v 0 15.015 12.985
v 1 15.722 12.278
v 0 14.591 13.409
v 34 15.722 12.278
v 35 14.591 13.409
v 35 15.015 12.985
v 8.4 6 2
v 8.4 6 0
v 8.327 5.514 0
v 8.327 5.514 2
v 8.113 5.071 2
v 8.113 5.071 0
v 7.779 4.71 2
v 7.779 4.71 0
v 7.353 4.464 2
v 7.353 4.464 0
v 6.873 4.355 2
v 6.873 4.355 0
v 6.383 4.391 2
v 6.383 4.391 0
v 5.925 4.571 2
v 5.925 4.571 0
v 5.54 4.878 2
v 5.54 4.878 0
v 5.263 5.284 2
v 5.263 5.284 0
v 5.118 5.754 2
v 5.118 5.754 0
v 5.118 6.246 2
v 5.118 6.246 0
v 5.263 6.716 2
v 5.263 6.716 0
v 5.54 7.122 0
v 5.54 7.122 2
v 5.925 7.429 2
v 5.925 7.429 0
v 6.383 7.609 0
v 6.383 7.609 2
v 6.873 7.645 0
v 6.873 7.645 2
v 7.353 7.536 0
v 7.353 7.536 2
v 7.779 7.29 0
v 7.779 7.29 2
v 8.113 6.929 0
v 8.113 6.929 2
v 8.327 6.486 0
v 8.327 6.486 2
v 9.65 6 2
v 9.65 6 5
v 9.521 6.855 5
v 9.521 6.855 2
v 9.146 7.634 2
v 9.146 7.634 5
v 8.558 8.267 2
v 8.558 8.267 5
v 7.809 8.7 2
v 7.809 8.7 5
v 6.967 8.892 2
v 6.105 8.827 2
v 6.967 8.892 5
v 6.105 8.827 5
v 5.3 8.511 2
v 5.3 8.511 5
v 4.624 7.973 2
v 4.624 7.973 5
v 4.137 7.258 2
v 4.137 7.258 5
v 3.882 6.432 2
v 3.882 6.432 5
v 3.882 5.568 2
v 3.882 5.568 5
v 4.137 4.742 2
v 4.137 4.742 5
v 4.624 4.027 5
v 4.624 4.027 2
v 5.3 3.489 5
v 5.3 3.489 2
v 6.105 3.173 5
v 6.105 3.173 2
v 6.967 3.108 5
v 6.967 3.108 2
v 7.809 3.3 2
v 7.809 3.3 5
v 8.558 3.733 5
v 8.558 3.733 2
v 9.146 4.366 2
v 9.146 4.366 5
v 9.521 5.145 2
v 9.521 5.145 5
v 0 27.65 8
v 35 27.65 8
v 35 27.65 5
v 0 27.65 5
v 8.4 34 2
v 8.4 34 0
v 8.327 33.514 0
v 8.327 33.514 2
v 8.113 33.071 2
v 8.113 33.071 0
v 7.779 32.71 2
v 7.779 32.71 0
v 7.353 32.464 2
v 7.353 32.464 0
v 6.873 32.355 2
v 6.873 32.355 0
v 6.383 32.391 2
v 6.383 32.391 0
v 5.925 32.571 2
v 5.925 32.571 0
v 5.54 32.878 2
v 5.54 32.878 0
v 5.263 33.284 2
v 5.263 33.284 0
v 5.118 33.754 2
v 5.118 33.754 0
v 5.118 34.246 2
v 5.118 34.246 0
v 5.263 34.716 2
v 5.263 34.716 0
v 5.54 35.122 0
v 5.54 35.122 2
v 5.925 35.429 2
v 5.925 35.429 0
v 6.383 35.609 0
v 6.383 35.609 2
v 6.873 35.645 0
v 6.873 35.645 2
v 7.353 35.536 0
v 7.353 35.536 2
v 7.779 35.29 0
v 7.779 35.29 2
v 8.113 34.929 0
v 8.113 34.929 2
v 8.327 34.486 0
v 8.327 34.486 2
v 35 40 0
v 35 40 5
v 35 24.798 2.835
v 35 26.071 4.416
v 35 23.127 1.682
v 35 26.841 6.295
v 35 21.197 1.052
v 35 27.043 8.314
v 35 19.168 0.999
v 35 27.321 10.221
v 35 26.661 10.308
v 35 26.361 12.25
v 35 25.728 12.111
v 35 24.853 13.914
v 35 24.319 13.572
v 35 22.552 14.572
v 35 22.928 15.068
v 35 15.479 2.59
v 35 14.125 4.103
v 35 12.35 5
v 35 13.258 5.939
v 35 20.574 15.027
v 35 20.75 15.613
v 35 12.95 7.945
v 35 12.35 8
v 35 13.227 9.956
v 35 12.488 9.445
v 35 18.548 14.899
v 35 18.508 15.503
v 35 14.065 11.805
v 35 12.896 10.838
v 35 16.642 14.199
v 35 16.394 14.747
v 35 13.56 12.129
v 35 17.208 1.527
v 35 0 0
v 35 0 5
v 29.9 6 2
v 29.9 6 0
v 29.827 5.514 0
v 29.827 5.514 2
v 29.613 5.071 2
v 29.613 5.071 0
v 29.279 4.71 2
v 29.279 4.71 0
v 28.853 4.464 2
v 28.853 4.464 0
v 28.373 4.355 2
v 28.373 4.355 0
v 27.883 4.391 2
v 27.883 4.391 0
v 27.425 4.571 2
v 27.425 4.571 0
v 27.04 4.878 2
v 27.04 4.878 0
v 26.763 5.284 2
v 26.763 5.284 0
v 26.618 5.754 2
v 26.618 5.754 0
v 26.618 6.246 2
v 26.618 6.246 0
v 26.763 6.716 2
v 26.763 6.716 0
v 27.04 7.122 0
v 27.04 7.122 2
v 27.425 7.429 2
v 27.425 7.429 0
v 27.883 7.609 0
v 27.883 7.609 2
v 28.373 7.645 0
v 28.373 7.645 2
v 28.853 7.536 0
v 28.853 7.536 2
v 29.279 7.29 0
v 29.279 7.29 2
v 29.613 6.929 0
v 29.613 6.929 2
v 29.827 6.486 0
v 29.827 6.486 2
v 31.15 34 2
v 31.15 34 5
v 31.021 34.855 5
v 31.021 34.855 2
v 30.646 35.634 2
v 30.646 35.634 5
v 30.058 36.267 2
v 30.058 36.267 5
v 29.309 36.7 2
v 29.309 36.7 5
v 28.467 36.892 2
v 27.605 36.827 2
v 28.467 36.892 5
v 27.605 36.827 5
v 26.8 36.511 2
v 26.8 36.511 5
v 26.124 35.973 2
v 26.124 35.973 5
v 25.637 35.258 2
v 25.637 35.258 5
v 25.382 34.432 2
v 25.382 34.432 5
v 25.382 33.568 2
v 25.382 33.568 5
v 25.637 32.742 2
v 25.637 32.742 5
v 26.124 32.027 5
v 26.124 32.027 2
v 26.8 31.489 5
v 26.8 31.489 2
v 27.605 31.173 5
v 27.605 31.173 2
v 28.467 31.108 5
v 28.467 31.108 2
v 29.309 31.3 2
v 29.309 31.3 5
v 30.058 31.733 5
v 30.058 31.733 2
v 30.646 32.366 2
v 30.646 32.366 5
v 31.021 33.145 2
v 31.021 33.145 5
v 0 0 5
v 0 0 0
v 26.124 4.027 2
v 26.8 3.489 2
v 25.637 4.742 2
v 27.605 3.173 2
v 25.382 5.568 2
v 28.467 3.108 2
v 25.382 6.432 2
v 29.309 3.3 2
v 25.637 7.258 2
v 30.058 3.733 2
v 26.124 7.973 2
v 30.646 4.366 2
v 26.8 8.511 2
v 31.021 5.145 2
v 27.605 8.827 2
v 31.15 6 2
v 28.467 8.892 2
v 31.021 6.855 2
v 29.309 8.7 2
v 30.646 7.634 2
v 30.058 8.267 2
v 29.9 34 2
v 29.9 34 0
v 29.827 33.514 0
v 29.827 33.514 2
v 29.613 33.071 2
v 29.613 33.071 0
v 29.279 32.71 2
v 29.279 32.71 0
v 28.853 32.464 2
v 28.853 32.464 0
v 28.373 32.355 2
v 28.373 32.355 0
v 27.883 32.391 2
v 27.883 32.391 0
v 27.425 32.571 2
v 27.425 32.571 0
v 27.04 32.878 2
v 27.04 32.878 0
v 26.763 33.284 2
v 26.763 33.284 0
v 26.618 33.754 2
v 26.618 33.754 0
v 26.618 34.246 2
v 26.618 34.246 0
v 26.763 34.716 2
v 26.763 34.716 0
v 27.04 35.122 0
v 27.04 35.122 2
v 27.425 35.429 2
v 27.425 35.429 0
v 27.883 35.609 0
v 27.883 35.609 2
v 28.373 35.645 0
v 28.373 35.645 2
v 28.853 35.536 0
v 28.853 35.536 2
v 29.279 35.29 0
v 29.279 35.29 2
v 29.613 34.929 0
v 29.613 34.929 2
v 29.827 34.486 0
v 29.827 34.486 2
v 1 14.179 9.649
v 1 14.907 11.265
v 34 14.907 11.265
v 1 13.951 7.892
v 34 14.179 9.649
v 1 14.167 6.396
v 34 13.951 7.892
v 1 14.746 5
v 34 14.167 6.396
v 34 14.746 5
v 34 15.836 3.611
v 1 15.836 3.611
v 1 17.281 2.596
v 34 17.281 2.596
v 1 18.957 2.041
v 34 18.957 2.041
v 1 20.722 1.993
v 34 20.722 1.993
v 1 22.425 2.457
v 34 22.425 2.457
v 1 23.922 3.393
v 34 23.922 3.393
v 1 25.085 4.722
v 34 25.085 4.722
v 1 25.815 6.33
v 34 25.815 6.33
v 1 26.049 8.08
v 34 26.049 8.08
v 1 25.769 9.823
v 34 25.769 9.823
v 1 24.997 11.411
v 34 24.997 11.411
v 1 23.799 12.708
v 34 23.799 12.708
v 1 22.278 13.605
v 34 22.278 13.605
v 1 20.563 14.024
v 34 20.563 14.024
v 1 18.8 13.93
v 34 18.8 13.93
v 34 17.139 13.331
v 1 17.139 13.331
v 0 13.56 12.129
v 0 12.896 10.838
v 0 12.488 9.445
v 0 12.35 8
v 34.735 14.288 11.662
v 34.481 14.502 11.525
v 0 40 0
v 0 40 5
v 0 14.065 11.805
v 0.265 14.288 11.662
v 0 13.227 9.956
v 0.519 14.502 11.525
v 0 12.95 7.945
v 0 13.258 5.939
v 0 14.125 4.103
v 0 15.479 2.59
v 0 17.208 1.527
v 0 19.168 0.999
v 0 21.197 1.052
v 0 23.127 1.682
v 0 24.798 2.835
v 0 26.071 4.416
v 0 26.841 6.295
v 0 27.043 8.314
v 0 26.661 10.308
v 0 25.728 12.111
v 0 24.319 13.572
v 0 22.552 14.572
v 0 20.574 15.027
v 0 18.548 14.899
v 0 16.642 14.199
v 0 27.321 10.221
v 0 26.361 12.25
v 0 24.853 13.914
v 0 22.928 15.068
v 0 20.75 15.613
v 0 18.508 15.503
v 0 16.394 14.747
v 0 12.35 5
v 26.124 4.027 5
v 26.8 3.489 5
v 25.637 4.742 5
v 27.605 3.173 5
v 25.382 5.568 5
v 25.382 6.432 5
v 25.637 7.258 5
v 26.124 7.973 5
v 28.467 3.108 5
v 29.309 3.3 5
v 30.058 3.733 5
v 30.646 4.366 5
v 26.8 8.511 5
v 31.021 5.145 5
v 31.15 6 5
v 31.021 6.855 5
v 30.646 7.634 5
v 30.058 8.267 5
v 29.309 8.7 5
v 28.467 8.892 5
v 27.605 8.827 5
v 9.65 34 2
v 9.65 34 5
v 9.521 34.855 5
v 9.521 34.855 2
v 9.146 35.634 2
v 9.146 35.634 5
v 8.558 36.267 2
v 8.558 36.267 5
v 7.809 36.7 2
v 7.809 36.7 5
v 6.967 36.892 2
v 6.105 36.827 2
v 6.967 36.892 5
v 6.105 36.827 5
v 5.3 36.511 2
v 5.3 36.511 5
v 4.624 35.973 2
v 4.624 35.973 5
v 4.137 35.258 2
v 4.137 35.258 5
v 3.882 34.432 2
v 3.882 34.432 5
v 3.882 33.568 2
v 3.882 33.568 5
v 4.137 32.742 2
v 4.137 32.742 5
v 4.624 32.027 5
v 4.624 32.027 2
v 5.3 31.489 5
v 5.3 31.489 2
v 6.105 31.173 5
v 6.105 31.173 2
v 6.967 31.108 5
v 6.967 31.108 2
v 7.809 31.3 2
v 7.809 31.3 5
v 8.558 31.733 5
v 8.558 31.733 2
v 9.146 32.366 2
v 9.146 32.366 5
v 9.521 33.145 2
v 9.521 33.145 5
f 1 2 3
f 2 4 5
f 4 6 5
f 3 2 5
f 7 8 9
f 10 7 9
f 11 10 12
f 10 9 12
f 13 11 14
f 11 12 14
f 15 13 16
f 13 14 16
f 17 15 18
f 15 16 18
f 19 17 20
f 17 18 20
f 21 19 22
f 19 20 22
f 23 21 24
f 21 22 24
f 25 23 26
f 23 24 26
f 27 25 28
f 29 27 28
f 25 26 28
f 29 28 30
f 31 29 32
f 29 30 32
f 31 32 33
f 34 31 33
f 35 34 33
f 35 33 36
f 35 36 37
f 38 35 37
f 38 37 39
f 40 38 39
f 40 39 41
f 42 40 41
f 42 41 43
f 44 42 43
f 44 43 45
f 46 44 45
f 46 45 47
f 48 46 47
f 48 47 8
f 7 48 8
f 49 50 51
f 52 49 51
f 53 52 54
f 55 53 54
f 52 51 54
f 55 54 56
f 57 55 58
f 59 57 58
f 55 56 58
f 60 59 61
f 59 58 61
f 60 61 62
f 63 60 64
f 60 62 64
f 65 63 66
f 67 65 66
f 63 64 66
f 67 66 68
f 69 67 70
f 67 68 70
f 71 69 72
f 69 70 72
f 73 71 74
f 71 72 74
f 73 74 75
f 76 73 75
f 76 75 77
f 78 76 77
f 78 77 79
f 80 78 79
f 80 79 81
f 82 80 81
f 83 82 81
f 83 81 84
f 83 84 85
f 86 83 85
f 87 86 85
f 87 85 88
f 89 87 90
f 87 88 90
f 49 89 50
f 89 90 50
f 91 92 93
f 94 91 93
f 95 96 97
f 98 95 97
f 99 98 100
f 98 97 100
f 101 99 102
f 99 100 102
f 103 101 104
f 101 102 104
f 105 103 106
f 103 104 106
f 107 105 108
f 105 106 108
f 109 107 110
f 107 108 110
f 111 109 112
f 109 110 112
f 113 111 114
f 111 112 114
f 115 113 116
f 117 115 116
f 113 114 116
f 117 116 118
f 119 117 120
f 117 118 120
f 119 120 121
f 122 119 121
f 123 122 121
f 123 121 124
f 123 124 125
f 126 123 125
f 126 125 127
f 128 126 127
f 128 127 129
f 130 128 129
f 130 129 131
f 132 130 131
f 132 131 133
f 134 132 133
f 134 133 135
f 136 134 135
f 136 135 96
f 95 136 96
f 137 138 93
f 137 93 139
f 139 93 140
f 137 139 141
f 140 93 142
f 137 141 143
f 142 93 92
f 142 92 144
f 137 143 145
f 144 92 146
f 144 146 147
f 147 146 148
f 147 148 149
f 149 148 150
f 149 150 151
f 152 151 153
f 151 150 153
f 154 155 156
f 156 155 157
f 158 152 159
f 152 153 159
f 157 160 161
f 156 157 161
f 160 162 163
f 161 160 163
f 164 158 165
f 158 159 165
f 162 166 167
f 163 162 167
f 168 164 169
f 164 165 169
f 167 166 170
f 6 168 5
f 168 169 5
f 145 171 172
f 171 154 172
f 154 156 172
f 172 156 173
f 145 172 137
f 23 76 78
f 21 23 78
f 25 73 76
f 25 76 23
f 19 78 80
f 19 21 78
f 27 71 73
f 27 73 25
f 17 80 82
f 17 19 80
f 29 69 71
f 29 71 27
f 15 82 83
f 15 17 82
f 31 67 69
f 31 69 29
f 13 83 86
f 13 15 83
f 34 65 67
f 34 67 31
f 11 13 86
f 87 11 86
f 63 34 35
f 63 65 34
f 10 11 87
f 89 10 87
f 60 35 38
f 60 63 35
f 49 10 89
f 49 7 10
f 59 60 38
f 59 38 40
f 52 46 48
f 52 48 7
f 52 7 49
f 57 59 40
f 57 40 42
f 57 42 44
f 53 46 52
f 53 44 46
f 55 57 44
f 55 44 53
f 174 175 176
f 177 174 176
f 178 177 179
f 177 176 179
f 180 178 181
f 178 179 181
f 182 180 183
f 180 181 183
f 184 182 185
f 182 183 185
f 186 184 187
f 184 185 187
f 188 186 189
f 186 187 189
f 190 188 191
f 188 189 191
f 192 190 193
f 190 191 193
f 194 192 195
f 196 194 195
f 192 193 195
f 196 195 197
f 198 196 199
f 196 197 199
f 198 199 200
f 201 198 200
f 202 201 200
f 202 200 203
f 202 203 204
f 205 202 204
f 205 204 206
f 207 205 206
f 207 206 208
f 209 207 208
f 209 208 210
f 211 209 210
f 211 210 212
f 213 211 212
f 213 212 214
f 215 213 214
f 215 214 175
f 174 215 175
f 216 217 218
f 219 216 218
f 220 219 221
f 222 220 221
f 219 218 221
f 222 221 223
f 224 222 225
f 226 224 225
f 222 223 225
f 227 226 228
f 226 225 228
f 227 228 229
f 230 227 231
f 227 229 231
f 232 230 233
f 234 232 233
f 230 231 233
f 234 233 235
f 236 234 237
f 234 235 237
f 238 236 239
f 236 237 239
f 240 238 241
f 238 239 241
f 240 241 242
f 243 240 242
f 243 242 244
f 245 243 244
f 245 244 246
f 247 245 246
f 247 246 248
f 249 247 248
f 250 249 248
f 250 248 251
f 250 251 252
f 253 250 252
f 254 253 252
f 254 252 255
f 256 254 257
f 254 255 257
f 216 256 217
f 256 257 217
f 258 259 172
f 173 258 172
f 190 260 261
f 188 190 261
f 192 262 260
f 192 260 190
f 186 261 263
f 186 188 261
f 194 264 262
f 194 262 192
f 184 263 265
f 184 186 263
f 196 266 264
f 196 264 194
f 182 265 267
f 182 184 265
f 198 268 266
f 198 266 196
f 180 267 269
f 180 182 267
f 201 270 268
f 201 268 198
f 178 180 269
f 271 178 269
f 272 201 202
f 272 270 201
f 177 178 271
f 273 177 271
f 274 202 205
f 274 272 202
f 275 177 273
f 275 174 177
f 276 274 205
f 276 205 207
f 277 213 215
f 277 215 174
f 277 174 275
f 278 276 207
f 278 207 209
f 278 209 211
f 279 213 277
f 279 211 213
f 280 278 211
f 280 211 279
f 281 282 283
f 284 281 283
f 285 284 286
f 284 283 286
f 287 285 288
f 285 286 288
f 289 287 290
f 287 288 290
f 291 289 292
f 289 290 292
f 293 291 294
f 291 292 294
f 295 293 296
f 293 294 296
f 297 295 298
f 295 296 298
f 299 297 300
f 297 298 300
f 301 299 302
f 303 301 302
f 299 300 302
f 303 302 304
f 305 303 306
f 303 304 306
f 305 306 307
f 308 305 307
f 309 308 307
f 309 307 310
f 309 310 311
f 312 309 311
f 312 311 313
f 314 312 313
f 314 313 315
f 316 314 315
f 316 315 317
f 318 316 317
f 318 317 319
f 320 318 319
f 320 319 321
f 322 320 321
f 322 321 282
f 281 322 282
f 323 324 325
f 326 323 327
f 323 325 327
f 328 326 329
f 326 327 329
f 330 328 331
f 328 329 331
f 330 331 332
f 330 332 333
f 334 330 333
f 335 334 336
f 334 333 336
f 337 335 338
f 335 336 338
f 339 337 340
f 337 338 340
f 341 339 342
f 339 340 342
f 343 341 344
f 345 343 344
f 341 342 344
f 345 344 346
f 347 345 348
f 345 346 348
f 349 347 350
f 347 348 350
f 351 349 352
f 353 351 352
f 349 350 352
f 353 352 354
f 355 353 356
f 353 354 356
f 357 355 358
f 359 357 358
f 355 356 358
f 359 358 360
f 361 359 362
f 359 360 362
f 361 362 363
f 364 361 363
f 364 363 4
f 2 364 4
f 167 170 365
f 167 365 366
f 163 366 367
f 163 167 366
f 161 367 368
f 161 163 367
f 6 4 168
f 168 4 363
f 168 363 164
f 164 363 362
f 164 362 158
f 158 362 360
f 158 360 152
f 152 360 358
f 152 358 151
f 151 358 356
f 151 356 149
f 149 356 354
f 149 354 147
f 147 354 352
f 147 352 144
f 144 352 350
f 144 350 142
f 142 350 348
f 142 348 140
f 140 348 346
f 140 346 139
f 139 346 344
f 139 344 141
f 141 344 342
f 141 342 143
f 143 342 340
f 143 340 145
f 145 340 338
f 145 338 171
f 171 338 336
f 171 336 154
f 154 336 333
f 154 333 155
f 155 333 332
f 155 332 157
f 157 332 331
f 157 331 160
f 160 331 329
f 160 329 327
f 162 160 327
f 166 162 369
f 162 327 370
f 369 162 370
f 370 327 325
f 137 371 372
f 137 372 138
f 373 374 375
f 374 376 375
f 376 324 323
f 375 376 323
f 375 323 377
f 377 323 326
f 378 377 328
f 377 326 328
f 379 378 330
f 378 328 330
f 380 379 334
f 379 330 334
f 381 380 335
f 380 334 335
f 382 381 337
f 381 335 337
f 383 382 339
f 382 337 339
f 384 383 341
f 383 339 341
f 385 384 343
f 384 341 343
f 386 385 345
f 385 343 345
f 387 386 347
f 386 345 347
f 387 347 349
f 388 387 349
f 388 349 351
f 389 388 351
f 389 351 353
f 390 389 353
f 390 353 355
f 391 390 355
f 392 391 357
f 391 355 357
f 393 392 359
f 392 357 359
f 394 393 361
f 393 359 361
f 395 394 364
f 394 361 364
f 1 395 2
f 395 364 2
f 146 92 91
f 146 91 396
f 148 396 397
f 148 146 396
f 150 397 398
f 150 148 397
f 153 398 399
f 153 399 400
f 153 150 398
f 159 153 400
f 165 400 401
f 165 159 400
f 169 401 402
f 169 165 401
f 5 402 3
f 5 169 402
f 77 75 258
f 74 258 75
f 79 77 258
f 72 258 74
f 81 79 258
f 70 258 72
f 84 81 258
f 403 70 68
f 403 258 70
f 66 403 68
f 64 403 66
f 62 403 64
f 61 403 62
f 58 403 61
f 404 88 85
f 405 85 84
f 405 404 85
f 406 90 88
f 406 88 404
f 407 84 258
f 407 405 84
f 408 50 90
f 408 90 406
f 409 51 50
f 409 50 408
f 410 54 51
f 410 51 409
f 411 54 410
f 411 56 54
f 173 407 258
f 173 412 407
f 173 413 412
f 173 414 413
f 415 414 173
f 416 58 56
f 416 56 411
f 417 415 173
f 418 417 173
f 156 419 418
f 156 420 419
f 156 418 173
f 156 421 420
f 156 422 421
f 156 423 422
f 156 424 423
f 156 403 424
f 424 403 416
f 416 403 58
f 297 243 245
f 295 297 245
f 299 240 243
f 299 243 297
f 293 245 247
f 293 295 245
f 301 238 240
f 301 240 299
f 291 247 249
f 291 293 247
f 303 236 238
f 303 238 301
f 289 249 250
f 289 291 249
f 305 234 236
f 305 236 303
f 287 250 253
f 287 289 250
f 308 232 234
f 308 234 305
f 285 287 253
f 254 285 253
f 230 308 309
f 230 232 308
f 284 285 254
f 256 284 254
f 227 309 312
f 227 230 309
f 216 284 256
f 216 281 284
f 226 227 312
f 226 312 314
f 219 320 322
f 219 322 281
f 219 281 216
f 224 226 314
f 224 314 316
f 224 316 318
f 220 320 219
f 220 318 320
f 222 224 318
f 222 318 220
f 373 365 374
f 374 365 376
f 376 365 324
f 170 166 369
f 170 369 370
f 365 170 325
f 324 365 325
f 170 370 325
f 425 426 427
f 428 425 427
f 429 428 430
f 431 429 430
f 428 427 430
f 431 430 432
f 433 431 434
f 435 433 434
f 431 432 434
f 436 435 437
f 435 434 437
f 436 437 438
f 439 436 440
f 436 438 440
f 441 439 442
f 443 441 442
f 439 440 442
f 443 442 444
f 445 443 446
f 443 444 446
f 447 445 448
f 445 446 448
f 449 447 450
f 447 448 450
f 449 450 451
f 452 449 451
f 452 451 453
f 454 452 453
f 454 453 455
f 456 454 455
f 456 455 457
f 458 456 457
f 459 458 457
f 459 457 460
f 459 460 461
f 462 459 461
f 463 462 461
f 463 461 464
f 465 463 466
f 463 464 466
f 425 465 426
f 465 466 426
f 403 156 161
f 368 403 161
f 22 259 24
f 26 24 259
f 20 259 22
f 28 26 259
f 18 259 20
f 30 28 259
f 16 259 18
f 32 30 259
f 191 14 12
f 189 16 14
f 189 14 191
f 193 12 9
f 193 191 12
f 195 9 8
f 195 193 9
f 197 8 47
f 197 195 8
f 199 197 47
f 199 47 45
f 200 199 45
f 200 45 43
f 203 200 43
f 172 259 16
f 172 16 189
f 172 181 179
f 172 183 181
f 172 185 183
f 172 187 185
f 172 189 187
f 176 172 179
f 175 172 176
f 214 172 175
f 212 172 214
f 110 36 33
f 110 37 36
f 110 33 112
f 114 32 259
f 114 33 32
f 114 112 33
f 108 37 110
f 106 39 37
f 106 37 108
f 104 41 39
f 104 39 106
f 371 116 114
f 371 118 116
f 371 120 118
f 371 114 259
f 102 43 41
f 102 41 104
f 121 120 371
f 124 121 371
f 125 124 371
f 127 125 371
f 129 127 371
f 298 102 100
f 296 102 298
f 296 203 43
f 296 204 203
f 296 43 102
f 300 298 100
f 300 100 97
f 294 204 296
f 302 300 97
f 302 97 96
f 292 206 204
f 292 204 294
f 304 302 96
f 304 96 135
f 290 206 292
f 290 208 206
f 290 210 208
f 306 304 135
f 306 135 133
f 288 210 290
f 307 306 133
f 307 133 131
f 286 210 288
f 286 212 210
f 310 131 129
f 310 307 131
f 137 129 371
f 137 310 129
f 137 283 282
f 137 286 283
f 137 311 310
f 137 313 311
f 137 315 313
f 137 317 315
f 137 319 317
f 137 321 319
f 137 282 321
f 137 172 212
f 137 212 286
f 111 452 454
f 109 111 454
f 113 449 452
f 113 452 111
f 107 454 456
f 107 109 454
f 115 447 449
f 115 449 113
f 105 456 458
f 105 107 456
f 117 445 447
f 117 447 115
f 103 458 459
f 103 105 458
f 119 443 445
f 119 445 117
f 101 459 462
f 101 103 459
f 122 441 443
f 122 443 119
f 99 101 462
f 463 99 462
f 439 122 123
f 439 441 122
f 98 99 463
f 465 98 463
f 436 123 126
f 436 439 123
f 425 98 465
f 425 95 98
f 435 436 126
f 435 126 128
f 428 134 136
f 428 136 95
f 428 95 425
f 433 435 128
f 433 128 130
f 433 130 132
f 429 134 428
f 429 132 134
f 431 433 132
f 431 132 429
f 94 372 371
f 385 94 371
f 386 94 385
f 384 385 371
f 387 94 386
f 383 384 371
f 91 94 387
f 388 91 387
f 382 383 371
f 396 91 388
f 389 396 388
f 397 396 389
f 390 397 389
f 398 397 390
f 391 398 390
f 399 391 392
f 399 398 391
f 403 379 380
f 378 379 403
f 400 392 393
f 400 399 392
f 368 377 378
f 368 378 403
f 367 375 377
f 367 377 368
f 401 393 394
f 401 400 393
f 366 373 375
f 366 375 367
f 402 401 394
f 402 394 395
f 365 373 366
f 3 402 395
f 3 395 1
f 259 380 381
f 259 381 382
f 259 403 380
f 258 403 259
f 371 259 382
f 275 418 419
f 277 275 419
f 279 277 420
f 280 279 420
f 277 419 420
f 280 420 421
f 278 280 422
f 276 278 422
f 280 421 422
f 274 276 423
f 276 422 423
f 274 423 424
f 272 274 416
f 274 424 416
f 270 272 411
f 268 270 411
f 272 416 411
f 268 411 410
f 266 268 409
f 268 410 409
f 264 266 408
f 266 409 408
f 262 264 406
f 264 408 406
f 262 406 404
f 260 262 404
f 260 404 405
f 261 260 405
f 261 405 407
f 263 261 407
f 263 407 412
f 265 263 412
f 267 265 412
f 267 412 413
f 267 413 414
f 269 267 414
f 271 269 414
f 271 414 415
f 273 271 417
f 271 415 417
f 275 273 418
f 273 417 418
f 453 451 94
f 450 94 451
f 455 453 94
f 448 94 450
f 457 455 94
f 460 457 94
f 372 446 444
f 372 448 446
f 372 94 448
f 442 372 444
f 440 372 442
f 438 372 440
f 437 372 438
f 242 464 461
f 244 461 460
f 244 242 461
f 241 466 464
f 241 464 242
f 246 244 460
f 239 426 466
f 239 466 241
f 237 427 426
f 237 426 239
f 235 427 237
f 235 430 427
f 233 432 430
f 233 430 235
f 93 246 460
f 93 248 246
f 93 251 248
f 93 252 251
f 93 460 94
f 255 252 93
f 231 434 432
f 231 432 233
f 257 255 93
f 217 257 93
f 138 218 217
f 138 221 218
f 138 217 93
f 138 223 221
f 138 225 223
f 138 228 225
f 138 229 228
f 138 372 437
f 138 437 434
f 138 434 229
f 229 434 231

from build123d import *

# Parameters (mm, degrees)
BOX_W           = 35
BOX_H           = 40
BOX_DEPTH       = 5
PAD_DEPTH       = 35
SKETCH001_R     = 6.05
POCKET_DEPTH    = 35.001
SKETCH002_R     = 1.65
POCKET001_DEPTH = 15.651
SKETCH003_R     = 2.9
POCKET002_DEPTH = 3
CHAMFER_SIZE    = 1
CHAMFER001_SIZE = 1


with BuildPart() as part:
    # Box → Box (new body)
    with BuildSketch(Plane.XY):
        with Locations((17.5, 20)):
            Rectangle(BOX_W, BOX_H)
    extrude(amount=BOX_DEPTH)

    # Sketch → Pad (new body)
    with BuildSketch(Plane.YZ.offset(35)):
        with BuildLine():
            ThreePointArc((14.906847, 11.265317), (24.712853, 4.206385), (15.722004, 12.277996))
            Line((15.722004, 12.277996), (14.590633, 13.409367))
            ThreePointArc((27.65, 7.999994), (22.927531, 15.067677), (14.590633, 13.409367))
            Line((27.65, 7.999994), (27.65, 0))
            Line((12.35, 0), (27.65, 0))
            Line((12.35, 0), (12.35, 7.999994))
            ThreePointArc((13.559898, 12.128872), (12.658702, 10.151243), (12.35, 7.999994))
            Line((13.559898, 12.128872), (14.906847, 11.265317))
        make_face()
    extrude(amount=-PAD_DEPTH)

    # Sketch001 → Pocket (cut, through all)
    with BuildSketch(Plane.YZ.offset(35)):
        with Locations((20, 8)):
            Circle(SKETCH001_R)
    extrude(amount=-POCKET_DEPTH, mode=Mode.SUBTRACT)

    # Sketch002 → Pocket001 (cut, through all)
    with BuildSketch(Plane(origin=(0, 0, 0), x_dir=(1, 0, 0), z_dir=(0, 0, -1))):
        with Locations((6.75, -6)):
            Circle(SKETCH002_R)
        with Locations((28.25, -6)):
            Circle(SKETCH002_R)
        with Locations((6.75, -34)):
            Circle(SKETCH002_R)
        with Locations((28.25, -34)):
            Circle(SKETCH002_R)
    extrude(amount=-POCKET001_DEPTH, mode=Mode.SUBTRACT)

    # Sketch003 → Pocket002 (cut)
    with BuildSketch(Plane.XY.offset(5)):
        with Locations((6.75, 34)):
            Circle(SKETCH003_R)
        with Locations((28.25, 34)):
            Circle(SKETCH003_R)
        with Locations((6.75, 6)):
            Circle(SKETCH003_R)
        with Locations((28.25, 6)):
            Circle(SKETCH003_R)
    extrude(amount=-POCKET002_DEPTH, mode=Mode.SUBTRACT)

    # Chamfer
    chamfer_edges = [part.edges().sort_by_distance(p)[0] for p in [
        (35, 20, 1.95),
    ]]
    chamfer(chamfer_edges, length=CHAMFER_SIZE)

    # Chamfer001
    chamfer001_edges = [part.edges().sort_by_distance(p)[0] for p in [
        (0, 20, 1.95),
    ]]
    chamfer(chamfer001_edges, length=CHAMFER001_SIZE)


solid = part.part
